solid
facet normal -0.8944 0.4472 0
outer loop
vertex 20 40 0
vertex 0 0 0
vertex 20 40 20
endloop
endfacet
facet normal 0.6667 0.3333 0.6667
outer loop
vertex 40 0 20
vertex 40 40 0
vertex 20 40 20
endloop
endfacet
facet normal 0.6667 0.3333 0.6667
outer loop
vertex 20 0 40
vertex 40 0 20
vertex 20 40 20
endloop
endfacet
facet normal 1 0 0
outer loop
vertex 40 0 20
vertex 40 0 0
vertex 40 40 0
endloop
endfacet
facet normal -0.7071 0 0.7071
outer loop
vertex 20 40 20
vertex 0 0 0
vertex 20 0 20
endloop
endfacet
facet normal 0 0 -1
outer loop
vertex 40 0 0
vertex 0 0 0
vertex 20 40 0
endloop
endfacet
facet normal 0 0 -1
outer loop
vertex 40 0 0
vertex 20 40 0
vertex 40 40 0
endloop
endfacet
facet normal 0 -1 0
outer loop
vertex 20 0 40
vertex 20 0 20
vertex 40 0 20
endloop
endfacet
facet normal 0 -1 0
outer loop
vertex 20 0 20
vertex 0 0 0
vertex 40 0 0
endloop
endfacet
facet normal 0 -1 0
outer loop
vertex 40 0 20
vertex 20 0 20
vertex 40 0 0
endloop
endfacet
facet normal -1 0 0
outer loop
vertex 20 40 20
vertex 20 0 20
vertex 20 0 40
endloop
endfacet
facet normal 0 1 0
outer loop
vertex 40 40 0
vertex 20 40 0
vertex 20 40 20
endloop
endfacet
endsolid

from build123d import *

# Parameters (mm, degrees)
SKETCH1_W           = 40
SKETCH1_H           = 40
BOSS_EXTRUDE1_DEPTH = 40
CUT_EXTRUDE1_DEPTH  = 40
CUT_EXTRUDE2_DEPTH  = 40
CUT_EXTRUDE10_DEPTH = 40
CUT_EXTRUDE11_DEPTH = 40
CUT_EXTRUDE12_DEPTH = 40


with BuildPart() as part:
    # Sketch1 → Boss-Extrude1 (new body)
    with BuildSketch(Plane.XY):
        with Locations((20, 20)):
            Rectangle(SKETCH1_W, SKETCH1_H)
    extrude(amount=BOSS_EXTRUDE1_DEPTH)

    # Sketch2 → Cut-Extrude1 (cut)
    with BuildSketch(Plane.XY.offset(40)):
        Polygon((0, 0), (20, 40), (0, 40), align=None)
    extrude(amount=-CUT_EXTRUDE1_DEPTH, mode=Mode.SUBTRACT)

    # Sketch3 → Cut-Extrude2 (cut)
    with BuildSketch(Plane(origin=(0, 0, 0), x_dir=(-1, 0, 0), z_dir=(0, -1, 0))):
        Polygon((0, 0), (-20, -20), (-20, -40), (0, -40), align=None)
    extrude(amount=-CUT_EXTRUDE2_DEPTH, mode=Mode.SUBTRACT)

    # Sketch12 → Cut-Extrude10 (cut)
    with BuildSketch(Plane.ZY.offset(-20)):
        Polygon((20, 40), (40, 0), (40, 40), align=None)
    extrude(amount=-CUT_EXTRUDE10_DEPTH, mode=Mode.SUBTRACT)

    # Sketch13 → Cut-Extrude11 (cut)
    with BuildSketch(Plane.XZ):
        Polygon((20, 40), (40, 20), (40, 40), align=None)
    extrude(amount=-CUT_EXTRUDE11_DEPTH, mode=Mode.SUBTRACT)

    # Sketch14 → Cut-Extrude12 (cut)
    with BuildSketch(Plane(origin=(26.666666667, 13.333333333, 26.666666667), x_dir=(-0.745355992, 0.298142397, 0.596284794), z_dir=(-0.666666667, -0.333333333, -0.666666667))):
        Polygon((-17.88854382, 35.77708764), (-17.88854382, -8.94427191), (8.94427191, -17.88854382), (8.94427191, 26.83281573), align=None)
    extrude(amount=-CUT_EXTRUDE12_DEPTH, mode=Mode.SUBTRACT)


solid = part.part
